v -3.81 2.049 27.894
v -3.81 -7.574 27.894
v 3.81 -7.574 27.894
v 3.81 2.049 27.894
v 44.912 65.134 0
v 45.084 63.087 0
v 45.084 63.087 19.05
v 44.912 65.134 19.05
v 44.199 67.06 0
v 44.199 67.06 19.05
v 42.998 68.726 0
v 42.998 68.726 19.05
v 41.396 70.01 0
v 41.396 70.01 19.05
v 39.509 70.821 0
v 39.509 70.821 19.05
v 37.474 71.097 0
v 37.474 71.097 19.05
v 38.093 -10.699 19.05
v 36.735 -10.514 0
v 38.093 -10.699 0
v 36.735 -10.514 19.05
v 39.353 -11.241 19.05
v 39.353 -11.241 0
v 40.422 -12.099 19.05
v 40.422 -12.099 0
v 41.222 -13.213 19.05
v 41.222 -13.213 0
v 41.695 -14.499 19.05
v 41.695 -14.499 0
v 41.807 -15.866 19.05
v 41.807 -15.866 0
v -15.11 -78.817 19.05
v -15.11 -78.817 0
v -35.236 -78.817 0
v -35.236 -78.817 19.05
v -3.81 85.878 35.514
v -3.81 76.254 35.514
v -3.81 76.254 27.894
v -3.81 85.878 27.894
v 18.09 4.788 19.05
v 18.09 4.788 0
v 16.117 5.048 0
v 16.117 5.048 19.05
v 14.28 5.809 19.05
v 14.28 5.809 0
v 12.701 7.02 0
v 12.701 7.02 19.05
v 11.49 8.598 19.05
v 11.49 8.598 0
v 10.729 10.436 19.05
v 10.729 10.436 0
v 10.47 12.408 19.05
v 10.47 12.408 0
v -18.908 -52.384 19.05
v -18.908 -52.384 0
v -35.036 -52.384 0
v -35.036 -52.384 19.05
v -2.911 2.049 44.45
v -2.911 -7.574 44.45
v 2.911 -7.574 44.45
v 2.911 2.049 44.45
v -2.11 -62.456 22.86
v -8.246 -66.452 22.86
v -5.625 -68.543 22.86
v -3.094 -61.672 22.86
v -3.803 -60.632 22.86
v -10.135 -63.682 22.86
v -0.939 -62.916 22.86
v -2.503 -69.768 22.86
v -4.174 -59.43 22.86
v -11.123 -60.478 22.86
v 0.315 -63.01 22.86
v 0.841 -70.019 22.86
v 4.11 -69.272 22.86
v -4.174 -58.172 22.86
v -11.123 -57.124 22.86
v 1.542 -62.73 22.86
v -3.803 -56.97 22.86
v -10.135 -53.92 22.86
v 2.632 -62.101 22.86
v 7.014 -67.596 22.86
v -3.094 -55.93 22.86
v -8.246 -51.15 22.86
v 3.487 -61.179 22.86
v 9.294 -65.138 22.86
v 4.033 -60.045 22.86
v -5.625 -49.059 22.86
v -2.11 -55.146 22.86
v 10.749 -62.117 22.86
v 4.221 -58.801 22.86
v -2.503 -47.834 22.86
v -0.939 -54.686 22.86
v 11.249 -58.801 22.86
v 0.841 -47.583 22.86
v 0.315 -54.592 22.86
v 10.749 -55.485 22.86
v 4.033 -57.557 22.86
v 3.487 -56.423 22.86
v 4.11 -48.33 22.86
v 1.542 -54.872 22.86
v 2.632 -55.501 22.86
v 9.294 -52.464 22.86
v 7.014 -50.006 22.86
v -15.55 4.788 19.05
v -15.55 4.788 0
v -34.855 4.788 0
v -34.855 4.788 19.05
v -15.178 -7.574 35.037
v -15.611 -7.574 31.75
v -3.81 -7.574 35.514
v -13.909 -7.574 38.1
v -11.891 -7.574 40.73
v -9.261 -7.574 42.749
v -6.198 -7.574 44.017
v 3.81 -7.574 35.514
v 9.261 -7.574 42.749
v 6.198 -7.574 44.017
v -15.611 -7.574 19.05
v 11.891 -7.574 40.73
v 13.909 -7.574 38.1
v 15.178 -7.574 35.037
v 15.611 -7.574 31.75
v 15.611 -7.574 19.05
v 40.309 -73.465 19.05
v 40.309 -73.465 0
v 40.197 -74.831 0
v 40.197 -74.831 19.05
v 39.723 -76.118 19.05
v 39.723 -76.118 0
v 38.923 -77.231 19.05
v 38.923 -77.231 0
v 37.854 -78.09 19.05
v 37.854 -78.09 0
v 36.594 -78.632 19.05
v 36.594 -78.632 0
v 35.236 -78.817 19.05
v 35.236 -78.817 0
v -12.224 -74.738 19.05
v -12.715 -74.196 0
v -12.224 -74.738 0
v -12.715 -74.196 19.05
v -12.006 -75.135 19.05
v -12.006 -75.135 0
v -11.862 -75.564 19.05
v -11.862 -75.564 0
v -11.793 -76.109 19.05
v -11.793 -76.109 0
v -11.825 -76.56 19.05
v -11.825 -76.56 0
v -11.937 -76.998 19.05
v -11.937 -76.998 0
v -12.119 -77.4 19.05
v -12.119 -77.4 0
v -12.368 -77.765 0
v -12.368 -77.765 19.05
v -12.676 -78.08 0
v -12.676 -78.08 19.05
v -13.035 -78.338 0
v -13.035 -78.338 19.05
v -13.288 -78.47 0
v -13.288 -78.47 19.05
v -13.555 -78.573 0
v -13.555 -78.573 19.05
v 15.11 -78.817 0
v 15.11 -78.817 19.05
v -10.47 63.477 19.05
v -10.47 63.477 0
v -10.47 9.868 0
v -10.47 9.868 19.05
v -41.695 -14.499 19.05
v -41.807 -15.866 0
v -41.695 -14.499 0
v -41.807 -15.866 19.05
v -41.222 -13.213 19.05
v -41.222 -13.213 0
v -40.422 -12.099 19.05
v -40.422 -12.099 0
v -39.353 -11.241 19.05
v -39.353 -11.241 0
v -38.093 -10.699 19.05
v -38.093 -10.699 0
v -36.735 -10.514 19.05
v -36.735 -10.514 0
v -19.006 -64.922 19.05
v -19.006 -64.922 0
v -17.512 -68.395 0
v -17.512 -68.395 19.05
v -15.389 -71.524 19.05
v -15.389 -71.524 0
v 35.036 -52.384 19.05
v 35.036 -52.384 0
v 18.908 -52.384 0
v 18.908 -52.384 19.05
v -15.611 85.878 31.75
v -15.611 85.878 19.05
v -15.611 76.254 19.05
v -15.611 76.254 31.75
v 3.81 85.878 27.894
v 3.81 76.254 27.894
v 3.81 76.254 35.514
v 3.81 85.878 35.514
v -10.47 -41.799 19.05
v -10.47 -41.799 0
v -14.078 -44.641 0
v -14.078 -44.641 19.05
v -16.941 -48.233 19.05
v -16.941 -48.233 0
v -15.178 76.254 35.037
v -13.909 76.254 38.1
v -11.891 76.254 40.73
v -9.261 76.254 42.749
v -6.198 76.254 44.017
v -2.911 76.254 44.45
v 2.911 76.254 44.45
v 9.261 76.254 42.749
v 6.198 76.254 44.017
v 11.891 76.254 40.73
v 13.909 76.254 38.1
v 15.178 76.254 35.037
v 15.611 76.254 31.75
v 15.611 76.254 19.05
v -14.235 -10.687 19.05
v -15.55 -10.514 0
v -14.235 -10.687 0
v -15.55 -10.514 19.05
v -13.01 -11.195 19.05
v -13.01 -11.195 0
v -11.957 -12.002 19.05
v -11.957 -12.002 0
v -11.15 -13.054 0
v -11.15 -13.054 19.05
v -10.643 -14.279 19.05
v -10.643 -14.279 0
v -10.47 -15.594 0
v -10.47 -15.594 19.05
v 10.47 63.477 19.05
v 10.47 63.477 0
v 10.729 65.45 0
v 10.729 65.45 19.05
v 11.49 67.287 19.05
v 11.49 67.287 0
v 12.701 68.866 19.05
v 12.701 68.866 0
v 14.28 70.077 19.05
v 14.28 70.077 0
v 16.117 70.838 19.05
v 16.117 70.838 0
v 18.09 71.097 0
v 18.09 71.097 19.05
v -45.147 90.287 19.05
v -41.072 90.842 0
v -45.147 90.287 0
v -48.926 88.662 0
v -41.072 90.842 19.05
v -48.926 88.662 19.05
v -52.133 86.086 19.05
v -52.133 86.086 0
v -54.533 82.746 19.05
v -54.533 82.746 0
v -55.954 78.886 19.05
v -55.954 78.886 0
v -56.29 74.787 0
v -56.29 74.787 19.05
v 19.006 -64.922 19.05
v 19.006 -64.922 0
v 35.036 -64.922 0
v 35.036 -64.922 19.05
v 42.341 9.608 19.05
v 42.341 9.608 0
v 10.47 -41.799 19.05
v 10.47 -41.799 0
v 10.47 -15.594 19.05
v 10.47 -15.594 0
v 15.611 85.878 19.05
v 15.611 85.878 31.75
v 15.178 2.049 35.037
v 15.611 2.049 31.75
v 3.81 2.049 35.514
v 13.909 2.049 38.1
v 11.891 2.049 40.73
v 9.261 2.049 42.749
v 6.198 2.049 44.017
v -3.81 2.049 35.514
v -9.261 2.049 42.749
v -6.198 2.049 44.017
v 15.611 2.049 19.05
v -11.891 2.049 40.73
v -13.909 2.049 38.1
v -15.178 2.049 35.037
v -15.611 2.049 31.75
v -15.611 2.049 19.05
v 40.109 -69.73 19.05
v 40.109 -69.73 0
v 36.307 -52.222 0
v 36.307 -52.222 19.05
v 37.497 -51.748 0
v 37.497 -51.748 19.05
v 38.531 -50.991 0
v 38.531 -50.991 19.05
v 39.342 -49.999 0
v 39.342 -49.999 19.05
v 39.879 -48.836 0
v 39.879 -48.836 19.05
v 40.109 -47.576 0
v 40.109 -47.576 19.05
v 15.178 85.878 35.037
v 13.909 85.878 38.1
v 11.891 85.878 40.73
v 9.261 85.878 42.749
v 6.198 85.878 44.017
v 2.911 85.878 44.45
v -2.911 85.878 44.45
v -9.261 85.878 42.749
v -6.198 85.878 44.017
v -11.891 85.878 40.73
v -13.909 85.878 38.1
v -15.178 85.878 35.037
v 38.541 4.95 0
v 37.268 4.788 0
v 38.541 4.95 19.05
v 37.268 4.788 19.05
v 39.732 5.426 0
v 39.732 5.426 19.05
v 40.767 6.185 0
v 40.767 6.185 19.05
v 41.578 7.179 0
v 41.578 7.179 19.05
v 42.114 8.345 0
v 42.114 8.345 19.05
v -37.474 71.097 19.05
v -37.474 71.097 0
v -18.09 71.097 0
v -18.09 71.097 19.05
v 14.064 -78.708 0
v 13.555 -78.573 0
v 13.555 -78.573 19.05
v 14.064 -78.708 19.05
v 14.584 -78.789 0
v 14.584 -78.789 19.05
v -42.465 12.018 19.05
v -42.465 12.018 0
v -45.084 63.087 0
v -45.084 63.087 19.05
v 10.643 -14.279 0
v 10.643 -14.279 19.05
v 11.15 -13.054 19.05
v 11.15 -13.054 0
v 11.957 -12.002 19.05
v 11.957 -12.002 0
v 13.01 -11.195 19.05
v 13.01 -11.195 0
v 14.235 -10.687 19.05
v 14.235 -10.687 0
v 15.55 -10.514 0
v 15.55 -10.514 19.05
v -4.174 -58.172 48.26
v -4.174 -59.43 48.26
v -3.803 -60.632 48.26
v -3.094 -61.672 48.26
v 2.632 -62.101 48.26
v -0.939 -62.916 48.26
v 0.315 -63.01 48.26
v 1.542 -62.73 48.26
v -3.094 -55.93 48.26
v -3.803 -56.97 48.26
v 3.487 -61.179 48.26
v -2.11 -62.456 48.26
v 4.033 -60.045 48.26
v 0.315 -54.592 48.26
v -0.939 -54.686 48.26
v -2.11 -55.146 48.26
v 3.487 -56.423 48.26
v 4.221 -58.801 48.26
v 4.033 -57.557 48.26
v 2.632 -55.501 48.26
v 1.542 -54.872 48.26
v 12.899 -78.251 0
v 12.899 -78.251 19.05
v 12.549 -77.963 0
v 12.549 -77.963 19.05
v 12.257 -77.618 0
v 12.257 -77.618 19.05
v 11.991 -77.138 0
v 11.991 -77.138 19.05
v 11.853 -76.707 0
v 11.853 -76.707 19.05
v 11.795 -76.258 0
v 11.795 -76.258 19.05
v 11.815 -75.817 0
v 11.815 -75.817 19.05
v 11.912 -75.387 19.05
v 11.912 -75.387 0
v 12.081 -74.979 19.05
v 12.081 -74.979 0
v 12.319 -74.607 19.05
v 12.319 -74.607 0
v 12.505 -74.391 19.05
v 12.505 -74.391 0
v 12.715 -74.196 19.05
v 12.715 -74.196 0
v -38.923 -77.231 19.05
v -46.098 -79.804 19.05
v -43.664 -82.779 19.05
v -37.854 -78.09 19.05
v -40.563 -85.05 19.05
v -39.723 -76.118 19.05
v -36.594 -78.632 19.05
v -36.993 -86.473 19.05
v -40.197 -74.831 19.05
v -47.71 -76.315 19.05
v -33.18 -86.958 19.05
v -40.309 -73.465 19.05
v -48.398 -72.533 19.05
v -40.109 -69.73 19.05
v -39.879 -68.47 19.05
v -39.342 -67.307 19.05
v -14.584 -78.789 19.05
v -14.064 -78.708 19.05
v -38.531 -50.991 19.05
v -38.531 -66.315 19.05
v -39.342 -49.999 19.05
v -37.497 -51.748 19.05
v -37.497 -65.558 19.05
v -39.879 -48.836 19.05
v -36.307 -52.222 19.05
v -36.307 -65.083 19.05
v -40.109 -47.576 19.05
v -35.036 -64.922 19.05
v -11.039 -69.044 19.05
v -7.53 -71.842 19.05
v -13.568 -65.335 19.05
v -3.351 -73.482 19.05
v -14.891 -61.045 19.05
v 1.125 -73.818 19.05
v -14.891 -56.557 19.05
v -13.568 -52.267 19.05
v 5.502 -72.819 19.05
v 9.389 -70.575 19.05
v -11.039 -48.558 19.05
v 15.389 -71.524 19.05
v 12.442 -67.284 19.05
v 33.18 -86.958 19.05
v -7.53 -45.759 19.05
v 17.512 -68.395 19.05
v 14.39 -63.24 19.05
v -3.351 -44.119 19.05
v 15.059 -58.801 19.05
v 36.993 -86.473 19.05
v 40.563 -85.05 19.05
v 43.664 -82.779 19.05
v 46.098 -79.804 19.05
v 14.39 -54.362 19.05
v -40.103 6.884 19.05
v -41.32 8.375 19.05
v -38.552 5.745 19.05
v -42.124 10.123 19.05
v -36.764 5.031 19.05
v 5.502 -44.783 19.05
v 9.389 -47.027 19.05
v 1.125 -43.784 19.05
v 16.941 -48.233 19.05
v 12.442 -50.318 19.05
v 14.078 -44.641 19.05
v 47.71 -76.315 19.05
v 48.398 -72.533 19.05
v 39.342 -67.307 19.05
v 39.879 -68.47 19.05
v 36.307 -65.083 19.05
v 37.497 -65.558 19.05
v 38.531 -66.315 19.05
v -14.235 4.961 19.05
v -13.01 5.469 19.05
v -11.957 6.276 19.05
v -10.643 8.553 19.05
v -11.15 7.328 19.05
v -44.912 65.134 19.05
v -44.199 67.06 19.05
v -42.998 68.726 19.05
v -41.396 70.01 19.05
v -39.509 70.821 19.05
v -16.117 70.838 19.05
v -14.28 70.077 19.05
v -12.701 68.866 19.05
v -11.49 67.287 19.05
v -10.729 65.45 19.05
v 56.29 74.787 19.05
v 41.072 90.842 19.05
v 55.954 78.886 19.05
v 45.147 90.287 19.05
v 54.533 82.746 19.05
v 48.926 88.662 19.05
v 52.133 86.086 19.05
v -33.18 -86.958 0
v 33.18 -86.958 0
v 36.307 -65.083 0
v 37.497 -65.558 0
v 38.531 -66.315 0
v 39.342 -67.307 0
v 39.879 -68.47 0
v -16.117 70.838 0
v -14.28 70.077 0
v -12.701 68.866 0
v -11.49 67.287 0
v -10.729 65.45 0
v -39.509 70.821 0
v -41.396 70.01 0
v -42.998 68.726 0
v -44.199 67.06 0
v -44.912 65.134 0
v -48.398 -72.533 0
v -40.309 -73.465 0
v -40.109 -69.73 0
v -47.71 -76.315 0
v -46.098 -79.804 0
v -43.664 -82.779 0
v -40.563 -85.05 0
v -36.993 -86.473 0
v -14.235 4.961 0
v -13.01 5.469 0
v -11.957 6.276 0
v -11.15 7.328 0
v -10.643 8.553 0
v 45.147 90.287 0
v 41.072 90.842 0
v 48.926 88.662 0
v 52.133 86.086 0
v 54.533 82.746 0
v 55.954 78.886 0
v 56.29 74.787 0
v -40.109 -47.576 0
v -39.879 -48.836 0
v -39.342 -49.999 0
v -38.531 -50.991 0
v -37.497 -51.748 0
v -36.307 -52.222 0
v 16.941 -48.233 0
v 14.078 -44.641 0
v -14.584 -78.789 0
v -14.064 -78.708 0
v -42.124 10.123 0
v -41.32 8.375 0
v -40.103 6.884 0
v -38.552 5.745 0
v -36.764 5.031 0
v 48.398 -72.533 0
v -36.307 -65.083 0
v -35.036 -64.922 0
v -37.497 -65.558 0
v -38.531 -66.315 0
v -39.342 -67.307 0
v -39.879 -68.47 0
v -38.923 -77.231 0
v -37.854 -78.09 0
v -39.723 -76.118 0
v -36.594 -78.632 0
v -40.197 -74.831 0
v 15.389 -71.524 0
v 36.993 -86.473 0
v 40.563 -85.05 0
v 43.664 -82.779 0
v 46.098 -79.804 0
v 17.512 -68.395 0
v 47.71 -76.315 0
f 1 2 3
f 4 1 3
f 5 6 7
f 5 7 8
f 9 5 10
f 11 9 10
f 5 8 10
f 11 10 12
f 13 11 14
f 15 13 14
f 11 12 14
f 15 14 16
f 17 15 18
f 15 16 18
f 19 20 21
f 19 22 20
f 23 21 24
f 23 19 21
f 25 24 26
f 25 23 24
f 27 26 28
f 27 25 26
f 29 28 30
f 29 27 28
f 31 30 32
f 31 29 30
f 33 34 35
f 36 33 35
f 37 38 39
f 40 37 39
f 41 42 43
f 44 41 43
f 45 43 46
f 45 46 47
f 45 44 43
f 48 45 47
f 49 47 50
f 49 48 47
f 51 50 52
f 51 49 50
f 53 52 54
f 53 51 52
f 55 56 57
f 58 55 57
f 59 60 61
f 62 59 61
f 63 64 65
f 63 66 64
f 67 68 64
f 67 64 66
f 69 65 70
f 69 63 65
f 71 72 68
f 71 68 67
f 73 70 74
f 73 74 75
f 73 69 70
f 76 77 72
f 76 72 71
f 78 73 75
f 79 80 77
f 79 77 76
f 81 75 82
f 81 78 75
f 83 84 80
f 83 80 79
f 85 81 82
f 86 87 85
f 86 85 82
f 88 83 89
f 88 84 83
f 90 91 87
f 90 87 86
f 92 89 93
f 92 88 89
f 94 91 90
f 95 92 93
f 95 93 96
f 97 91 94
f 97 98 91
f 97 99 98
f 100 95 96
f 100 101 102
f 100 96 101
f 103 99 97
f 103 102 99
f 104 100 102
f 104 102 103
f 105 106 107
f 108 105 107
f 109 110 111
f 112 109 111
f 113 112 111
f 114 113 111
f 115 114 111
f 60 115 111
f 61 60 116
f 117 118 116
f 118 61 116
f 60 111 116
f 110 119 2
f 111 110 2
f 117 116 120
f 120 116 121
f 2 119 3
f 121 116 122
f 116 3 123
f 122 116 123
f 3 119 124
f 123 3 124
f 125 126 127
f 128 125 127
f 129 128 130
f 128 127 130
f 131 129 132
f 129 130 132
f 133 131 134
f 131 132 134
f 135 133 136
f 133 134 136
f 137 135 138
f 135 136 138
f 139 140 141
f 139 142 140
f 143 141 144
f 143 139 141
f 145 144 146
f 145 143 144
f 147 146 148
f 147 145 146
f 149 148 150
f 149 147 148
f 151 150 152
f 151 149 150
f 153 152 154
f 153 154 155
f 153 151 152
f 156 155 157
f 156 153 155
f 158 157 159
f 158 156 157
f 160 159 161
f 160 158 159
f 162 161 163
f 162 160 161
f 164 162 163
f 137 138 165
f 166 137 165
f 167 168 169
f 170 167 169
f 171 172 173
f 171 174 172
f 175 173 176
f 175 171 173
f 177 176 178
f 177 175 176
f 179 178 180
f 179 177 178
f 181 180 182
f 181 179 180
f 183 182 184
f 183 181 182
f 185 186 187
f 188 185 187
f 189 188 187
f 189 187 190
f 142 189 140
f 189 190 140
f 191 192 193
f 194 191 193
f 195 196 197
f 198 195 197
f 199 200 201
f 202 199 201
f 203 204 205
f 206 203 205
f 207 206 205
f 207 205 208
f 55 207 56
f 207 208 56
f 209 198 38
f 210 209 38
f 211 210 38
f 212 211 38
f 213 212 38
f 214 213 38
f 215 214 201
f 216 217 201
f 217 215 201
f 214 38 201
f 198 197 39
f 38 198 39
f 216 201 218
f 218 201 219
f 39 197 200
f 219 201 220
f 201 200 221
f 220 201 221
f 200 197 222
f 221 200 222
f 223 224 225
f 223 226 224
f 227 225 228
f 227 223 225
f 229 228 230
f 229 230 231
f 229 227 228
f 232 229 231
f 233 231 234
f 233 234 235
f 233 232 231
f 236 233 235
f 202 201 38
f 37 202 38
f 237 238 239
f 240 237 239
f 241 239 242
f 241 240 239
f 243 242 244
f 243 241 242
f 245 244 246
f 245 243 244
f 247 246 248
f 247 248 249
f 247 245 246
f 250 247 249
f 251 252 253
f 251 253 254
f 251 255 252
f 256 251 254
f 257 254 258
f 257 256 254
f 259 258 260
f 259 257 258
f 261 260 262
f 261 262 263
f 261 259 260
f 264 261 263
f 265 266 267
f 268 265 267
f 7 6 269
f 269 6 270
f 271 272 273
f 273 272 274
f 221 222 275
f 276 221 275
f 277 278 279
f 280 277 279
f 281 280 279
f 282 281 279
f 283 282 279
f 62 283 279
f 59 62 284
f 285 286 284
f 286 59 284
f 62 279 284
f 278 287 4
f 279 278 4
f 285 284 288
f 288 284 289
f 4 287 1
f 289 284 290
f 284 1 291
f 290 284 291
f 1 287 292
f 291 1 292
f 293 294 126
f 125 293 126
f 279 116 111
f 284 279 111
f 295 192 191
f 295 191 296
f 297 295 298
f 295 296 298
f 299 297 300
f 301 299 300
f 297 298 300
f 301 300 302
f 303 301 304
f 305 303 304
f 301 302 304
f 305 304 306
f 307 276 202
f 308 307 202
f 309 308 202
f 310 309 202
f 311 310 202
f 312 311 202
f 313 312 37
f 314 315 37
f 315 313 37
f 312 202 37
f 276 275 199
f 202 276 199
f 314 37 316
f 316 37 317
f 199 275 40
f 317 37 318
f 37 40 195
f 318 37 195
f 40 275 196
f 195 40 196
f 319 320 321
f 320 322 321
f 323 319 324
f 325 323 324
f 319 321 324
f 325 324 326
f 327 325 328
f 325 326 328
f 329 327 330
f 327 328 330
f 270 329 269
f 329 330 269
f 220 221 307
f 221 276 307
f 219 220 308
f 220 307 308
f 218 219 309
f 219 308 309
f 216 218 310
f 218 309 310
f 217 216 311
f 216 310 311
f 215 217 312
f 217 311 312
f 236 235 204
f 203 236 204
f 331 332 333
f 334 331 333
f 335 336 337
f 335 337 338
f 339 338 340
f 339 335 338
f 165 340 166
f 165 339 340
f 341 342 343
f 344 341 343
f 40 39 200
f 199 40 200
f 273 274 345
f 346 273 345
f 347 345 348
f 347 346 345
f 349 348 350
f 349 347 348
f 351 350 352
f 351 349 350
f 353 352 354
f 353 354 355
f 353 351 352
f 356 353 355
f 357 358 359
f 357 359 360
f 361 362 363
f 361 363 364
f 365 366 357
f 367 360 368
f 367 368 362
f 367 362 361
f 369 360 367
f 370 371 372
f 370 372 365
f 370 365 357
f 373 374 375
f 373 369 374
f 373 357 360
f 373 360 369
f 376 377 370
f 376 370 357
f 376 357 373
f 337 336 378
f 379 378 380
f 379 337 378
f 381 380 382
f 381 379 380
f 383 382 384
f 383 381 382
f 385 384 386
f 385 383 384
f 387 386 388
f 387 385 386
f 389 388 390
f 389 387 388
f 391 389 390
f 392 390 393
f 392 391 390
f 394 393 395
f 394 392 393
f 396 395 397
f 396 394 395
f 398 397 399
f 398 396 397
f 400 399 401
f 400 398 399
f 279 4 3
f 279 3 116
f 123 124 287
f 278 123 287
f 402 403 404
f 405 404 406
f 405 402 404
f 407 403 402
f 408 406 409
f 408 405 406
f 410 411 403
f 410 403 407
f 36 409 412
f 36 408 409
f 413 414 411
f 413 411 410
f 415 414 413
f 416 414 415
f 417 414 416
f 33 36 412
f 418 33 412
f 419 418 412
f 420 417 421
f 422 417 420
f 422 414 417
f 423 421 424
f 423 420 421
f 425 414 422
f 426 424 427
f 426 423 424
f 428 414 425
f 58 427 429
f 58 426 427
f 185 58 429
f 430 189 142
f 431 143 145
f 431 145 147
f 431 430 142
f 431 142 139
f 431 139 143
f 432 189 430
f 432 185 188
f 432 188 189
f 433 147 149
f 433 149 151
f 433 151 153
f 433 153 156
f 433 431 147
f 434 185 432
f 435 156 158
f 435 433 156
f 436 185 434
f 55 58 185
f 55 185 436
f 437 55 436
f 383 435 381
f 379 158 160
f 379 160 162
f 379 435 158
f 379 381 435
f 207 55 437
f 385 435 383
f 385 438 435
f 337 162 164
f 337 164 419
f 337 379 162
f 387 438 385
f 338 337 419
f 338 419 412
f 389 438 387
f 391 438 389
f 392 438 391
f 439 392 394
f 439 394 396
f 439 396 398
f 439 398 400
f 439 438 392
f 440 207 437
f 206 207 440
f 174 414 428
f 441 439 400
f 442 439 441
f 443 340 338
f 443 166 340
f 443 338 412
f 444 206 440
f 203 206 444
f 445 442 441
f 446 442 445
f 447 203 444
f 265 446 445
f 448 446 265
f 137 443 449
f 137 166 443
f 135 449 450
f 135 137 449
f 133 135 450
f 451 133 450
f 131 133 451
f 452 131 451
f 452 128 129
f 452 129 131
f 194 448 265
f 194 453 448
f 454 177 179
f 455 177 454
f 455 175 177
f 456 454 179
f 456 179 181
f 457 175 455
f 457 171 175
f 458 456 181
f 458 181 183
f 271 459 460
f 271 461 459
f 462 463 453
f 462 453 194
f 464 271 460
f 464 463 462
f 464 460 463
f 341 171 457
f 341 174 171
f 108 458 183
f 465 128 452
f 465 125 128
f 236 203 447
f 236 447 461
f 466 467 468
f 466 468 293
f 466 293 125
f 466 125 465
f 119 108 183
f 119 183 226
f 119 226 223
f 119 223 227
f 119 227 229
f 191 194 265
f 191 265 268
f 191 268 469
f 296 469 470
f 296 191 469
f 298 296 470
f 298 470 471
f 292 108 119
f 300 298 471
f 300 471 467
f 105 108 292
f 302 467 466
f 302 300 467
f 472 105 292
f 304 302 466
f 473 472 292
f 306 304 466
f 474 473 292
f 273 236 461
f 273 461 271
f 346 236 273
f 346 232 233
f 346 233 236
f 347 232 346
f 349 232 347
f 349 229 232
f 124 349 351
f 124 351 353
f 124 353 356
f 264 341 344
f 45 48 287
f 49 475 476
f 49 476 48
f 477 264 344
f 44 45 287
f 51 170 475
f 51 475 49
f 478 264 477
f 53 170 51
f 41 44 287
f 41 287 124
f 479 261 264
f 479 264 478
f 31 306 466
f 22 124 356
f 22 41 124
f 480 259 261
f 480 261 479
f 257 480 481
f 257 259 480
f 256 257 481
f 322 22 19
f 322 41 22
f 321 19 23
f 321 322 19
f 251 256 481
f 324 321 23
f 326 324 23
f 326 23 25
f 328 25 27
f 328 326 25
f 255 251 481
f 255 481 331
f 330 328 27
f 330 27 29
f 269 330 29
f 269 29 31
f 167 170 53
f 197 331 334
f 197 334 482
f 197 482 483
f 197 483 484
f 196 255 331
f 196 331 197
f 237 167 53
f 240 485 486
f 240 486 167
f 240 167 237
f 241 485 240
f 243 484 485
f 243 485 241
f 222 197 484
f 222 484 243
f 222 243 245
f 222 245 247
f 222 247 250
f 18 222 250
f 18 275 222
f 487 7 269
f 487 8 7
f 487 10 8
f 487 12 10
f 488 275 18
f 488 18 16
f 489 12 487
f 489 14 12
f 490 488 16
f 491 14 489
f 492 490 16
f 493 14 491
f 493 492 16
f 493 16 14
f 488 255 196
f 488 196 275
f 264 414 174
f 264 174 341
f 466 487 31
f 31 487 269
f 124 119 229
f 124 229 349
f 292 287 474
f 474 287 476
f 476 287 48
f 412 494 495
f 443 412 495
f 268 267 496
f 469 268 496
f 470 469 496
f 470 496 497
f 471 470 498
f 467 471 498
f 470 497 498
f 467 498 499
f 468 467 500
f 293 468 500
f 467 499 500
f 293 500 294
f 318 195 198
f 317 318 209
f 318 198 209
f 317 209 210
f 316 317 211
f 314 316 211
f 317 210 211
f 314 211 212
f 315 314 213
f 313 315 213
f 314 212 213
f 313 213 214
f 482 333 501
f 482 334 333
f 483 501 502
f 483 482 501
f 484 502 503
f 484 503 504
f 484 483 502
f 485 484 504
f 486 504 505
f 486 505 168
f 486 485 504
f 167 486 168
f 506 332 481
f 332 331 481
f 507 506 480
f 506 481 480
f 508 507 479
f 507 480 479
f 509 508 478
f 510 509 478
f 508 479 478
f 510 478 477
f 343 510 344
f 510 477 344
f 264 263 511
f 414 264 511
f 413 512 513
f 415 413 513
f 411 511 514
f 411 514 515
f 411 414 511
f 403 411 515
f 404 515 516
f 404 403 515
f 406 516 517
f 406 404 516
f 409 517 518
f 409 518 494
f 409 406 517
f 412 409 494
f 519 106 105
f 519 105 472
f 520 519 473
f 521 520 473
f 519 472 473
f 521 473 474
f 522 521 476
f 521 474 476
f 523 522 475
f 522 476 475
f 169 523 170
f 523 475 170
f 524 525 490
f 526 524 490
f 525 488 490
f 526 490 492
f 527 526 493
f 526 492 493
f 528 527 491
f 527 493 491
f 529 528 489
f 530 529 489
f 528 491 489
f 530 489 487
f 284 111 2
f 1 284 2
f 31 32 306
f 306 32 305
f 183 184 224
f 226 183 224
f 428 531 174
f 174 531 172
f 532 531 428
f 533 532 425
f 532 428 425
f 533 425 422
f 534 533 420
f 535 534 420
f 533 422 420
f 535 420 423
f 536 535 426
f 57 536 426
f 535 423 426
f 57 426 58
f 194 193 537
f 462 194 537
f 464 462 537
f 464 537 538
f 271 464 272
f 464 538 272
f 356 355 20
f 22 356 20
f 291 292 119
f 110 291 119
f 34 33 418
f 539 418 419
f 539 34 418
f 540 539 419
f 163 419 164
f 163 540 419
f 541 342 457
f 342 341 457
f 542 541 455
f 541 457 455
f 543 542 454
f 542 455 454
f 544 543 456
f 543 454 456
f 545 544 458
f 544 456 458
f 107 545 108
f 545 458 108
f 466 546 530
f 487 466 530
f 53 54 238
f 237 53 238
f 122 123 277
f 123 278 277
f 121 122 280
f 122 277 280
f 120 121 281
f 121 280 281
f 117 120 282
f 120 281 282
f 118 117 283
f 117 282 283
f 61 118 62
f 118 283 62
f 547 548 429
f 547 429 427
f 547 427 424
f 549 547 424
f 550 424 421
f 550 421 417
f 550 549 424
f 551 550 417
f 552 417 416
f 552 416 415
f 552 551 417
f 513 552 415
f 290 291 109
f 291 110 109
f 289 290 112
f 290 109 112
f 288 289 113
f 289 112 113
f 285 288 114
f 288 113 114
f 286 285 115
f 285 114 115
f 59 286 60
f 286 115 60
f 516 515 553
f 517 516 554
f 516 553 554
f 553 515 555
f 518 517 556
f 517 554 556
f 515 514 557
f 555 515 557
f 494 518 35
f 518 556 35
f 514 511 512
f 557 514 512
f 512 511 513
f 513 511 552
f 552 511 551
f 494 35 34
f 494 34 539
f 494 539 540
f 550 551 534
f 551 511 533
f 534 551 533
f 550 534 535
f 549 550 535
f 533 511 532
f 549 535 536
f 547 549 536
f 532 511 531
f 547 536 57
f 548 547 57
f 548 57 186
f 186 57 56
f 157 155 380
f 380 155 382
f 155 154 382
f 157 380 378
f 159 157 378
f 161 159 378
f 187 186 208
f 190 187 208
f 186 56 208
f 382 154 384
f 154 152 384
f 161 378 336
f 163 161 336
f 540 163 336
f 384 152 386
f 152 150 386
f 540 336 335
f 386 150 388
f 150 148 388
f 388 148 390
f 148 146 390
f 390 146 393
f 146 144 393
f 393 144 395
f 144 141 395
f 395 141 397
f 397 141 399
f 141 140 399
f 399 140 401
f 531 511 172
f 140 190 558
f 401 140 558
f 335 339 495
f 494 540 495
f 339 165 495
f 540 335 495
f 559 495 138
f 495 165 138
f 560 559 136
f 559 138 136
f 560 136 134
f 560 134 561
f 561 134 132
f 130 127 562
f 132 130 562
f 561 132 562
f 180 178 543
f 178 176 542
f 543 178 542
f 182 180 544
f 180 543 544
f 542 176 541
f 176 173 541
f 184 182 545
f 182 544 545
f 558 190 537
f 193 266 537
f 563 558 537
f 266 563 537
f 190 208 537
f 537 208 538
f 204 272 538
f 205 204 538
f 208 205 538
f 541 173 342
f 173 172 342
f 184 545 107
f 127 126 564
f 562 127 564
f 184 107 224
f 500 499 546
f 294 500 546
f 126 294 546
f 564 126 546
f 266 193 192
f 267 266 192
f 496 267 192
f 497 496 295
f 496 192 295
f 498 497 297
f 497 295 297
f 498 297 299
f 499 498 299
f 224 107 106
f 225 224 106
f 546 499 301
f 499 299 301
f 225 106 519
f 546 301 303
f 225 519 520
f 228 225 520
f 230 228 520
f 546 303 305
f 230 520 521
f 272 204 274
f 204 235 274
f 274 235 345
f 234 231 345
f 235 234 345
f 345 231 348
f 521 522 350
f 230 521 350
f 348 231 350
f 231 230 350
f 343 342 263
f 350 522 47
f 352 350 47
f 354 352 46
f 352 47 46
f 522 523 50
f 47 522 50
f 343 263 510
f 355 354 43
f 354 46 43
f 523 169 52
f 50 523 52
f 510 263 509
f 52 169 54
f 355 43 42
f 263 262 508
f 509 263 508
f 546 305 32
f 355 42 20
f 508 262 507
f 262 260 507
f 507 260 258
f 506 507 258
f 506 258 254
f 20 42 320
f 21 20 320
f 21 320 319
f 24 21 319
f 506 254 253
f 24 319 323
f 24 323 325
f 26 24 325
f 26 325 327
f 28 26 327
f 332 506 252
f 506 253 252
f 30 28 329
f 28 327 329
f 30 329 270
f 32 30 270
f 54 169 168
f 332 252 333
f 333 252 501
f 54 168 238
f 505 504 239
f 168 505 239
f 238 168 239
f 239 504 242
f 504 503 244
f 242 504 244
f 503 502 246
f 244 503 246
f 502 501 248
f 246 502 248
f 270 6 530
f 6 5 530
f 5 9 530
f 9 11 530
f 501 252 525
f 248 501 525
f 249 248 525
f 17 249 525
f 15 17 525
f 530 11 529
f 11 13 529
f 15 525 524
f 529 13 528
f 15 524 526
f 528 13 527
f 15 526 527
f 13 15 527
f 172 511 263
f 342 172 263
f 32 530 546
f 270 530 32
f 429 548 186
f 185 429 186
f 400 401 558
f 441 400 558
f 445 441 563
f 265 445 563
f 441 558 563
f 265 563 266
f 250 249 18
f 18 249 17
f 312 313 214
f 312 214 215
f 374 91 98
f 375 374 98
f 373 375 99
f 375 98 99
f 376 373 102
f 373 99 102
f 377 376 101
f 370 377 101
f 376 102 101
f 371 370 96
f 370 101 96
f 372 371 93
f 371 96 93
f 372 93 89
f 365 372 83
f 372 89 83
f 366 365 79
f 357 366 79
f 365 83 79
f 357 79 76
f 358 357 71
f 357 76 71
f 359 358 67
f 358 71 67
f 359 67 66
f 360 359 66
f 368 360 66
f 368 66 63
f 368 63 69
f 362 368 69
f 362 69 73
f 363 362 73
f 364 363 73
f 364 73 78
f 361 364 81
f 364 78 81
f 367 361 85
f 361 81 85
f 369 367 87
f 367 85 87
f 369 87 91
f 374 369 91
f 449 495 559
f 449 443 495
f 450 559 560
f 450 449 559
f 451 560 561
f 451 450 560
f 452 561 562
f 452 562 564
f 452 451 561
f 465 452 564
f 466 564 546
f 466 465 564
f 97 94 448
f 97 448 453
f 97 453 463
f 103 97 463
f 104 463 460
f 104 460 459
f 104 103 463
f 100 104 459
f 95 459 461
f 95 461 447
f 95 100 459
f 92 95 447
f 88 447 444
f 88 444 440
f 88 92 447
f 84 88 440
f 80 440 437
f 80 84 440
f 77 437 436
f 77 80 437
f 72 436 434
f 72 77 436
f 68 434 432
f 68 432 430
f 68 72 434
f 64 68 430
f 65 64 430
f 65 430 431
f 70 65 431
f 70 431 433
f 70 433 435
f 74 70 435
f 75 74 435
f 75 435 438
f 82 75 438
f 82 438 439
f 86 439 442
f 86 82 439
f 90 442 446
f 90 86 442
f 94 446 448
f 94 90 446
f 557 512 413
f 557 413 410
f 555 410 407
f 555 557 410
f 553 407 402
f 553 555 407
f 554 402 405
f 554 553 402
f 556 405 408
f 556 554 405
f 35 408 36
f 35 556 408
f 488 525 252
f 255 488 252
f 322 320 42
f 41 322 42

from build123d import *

# Parameters (mm, degrees)
F1_DEPTH     = 19.05
F2_R         = 15.059033574
F3_DEPTH     = 3.81
F6_DEPTH     = 25.4
F8_DEPTH     = 98.4172728563
F4_R         = 4.2206847971
F9_DEPTH     = 25.4
F10_SIZE     = 3.80999
F11_R        = 12.7
F12_R        = 12.7
F13_R        = 7.62
F14_R        = 5.08
F15_R        = 7.62
F16_R        = 7.62
F17_R        = 5.08
F18_R        = 7.62
F19_R        = 5.08
F20_T1_DEPTH = 19.05
F21_R        = 2.54
F22_R        = 15.24


# Not quite as in the source:
# - a fillet or chamfer that OpenCascade refuses, or shapes differently, is made with other operations: its cross-section is extruded or revolved along the edge and cut away or added
# - a fillet or chamfer is up to 0.001 mm smaller than in the source, because OpenCascade refuses the exact size


with BuildPart() as f1:
    # F0 (on Top) → F1 (new body)
    with BuildSketch(Plane.XY):
        Polygon((57.15, 90.8419879414), (0, 90.8419879414), (-57.15, 90.8419879414), (-47.625, -86.9580120586), (0, -86.9580120586), (47.625, -86.9580120586), align=None)
        with BuildLine():
            Line((-39.8510134111, -64.9218410254), (-19.0060128585, -64.9218410254))
            ThreePointArc((-19.0060128585, -64.9218410254), (-15.7100075961, -71.1253052436), (-10.4695623741, -75.8033767343))
            Line((-10.4695623741, -75.8033767343), (-10.4695623741, -78.8165818754))
            Line((-10.4695623741, -78.8165818754), (-40.5953745281, -78.8165818754))
            Line((-40.5953745281, -78.8165818754), (-39.8510134111, -64.9218410254))
        make_face(mode=Mode.SUBTRACT)
        with BuildLine():
            Line((-42.0940332115, -10.5141438544), (-10.4695623741, -10.5141438544))
            Line((-10.4695623741, -10.5141438544), (-10.4695623741, -41.7985618114))
            ThreePointArc((-10.4695623741, -41.7985618114), (-15.6132317705, -46.3542592872), (-18.9080441845, -52.3838467943))
            Line((-18.9080441845, -52.3838467943), (-39.8510134111, -52.3838467943))
            Line((-39.8510134111, -52.3838467943), (-42.0940332115, -10.5141438544))
        make_face(mode=Mode.SUBTRACT)
        with BuildLine():
            Line((19.0060128585, -64.9218410254), (39.8510134111, -64.9218410254))
            Line((39.8510134111, -64.9218410254), (40.5953745281, -78.8165818754))
            Line((40.5953745281, -78.8165818754), (10.4695623741, -78.8165818754))
            Line((10.4695623741, -78.8165818754), (10.4695623741, -75.8033767343))
            ThreePointArc((10.4695623741, -75.8033767343), (15.7100075961, -71.1253052436), (19.0060128585, -64.9218410254))
        make_face(mode=Mode.SUBTRACT)
        with BuildLine():
            Line((10.4695623741, -10.5141438544), (42.0940332115, -10.5141438544))
            Line((42.0940332115, -10.5141438544), (39.8510134111, -52.3838467943))
            Line((39.8510134111, -52.3838467943), (18.9080441845, -52.3838467943))
            ThreePointArc((18.9080441845, -52.3838467943), (15.6132317705, -46.3542592872), (10.4695623741, -41.7985618114))
            Line((10.4695623741, -41.7985618114), (10.4695623741, -10.5141438544))
        make_face(mode=Mode.SUBTRACT)
        Polygon((-10.4695623741, 71.0973963141), (-10.4695623741, 4.7880196944), (-42.0940332115, 4.7880196944), (-45.4945191741, 71.0973963141), align=None, mode=Mode.SUBTRACT)
        Polygon((10.4695623741, 4.7880196944), (10.4695623741, 71.0973963141), (45.4945191741, 71.0973963141), (42.0940332115, 4.7880196944), align=None, mode=Mode.SUBTRACT)
    extrude(amount=F1_DEPTH)

    # F2 (on face) → F3 (join)
    with BuildSketch(Plane.XY.offset(19.05)):
        with Locations((0, -58.8009692729)):
            Circle(F2_R)
    extrude(amount=F3_DEPTH)

    # F5 (on face) → F6 (join)
    with BuildSketch(Plane.XY.offset(19.05)):
        Polygon((15.6109640375, 85.8776420355), (0, 85.8776420355), (-15.6109640375, 85.8776420355), (-15.6109640375, 76.2544423342), (0, 76.2544423342), (15.6109640375, 76.2544423342), align=None)
        Polygon((-15.6109640375, -7.5742849149), (0, -7.5742849149), (15.6109640375, -7.5742849149), (15.6109640375, 2.0489108283), (0, 2.0489108283), (-15.6109640375, 2.0489108283), align=None)
    extrude(amount=F6_DEPTH)

    # F7 (on face) → F8 (cut, through all)
    with BuildSketch(Plane.XZ.offset(7.5742849149)):
        Polygon((3.81, 35.5143319389), (0, 35.5143319389), (-3.81, 35.5143319389), (-3.81, 27.8943319389), (0, 27.8943319389), (3.81, 27.8943319389), align=None)
    extrude(amount=-F8_DEPTH, mode=Mode.SUBTRACT)

    # F4 (on face) → F9 (join)
    with BuildSketch(Plane.XY.offset(22.86)):
        with Locations((0, -58.8009692729)):
            Circle(F4_R)
    extrude(amount=F9_DEPTH)

    # F10 (size 3.81 in the source; OpenCascade refuses exactly that, so slightly less here)
    f10_edges = [f1.edges().sort_by_distance(p)[0] for p in [
        (-15.059034, -58.800969, 22.86),
    ]]
    chamfer(f10_edges, length=F10_SIZE)

    # F11
    f11_edges = [f1.edges().sort_by_distance(p)[0] for p in [
        (15.610964, -2.762687, 44.45),
        (-15.610964, -2.762687, 44.45),
    ]]
    fillet(f11_edges, radius=F11_R)

    # F12
    f12_edges = [f1.edges().sort_by_distance(p)[0] for p in [
        (15.610964, 81.066042, 44.45),
        (-15.610964, 81.066042, 44.45),
    ]]
    fillet(f12_edges, radius=F12_R)

    # F13
    f13_edges = [f1.edges().sort_by_distance(p)[0] for p in [
        (-45.494519, 71.097396, 9.525),
    ]]
    fillet(f13_edges, radius=F13_R)

    # F14
    f14_edges = [f1.edges().sort_by_distance(p)[0] for p in [
        (-42.094033, -10.514144, 9.525),
    ]]
    fillet(f14_edges, radius=F14_R)

    # F15
    f15_edges = [f1.edges().sort_by_distance(p)[0] for p in [
        (-10.469562, 71.097396, 9.525),
        (45.494519, 71.097396, 9.525),
    ]]
    fillet(f15_edges, radius=F15_R)

    # F16
    f16_edges = [f1.edges().sort_by_distance(p)[0] for p in [
        (-42.094033, 4.78802, 9.525),
        (10.469562, 4.78802, 9.525),
    ]]
    fillet(f16_edges, radius=F16_R)

    # F17
    f17_edges = [f1.edges().sort_by_distance(p)[0] for p in [
        (-10.469562, 4.78802, 9.525),
        (42.094033, 4.78802, 9.525),
    ]]
    fillet(f17_edges, radius=F17_R)

    # F18
    f18_edges = [f1.edges().sort_by_distance(p)[0] for p in [
        (10.469562, 71.097396, 9.525),
    ]]
    fillet(f18_edges, radius=F18_R)

    # F19
    f19_edges = [f1.edges().sort_by_distance(p)[0] for p in [
        (-10.469562, -10.514144, 9.525),
        (42.094033, -10.514144, 9.525),
        (10.469562, -10.514144, 9.525),
        (-39.851013, -52.383847, 9.525),
        (39.851013, -52.383847, 9.525),
    ]]
    fillet(f19_edges, radius=F19_R)

    # F20: fillet of radius 5.08 on 6 edges, made by hand

    # F20_s2 → F20_t1 (join)
    with BuildSketch(Plane.XY):
        with BuildLine():
            ThreePointArc((40.3086734646, -73.4648286909), (38.9228773885, -77.2312845683), (35.2359473527, -78.8165818754))
            Line((35.2359473527, -78.8165818754), (40.5953745281, -78.8165818754))
            Line((40.5953745281, -78.8165818754), (40.3086734646, -73.4648286909))
        make_face()
        with BuildLine():
            ThreePointArc((-15.1101182687, -78.8165818754), (-12.3436148694, -77.9971990774), (-10.4695623741, -75.8033767343))
            Line((-10.4695623741, -75.8033767343), (-10.4695623741, -78.8165818754))
            Line((-10.4695623741, -78.8165818754), (-15.1101182687, -78.8165818754))
        make_face()
        with BuildLine():
            ThreePointArc((-40.3086734646, -73.4648286909), (-38.9228773885, -77.2312845683), (-35.2359473527, -78.8165818754))
            Line((-35.2359473527, -78.8165818754), (-40.5953745281, -78.8165818754))
            Line((-40.5953745281, -78.8165818754), (-40.3086734646, -73.4648286909))
        make_face()
        with BuildLine():
            ThreePointArc((10.4695623741, -75.8033767343), (12.3436148694, -77.9971990774), (15.1101182687, -78.8165818754))
            Line((15.1101182687, -78.8165818754), (10.4695623741, -78.8165818754))
            Line((10.4695623741, -78.8165818754), (10.4695623741, -75.8033767343))
        make_face()
        with BuildLine():
            ThreePointArc((35.03587195, -64.9218410254), (38.5305746428, -66.3149109896), (40.1085980619, -69.7300878408))
            Line((40.1085980619, -69.7300878408), (39.8510134111, -64.9218410254))
            Line((39.8510134111, -64.9218410254), (35.03587195, -64.9218410254))
        make_face()
        with BuildLine():
            ThreePointArc((-35.03587195, -64.9218410254), (-38.5305746428, -66.3149109896), (-40.1085980619, -69.7300878408))
            Line((-40.1085980619, -69.7300878408), (-39.8510134111, -64.9218410254))
            Line((-39.8510134111, -64.9218410254), (-35.03587195, -64.9218410254))
        make_face()
    extrude(amount=F20_T1_DEPTH)

    # F21
    f21_edges = [f1.edges().sort_by_distance(p)[0] for p in [
        (10.469562, -75.803377, 9.525),
        (-10.469562, -75.803377, 9.525),
    ]]
    fillet(f21_edges, radius=F21_R)

    # F22
    f22_edges = [f1.edges().sort_by_distance(p)[0] for p in [
        (-47.625, -86.958012, 9.525),
        (-57.15, 90.841988, 9.525),
        (57.15, 90.841988, 9.525),
        (47.625, -86.958012, 9.525),
    ]]
    fillet(f22_edges, radius=F22_R)


solid = f1.part
